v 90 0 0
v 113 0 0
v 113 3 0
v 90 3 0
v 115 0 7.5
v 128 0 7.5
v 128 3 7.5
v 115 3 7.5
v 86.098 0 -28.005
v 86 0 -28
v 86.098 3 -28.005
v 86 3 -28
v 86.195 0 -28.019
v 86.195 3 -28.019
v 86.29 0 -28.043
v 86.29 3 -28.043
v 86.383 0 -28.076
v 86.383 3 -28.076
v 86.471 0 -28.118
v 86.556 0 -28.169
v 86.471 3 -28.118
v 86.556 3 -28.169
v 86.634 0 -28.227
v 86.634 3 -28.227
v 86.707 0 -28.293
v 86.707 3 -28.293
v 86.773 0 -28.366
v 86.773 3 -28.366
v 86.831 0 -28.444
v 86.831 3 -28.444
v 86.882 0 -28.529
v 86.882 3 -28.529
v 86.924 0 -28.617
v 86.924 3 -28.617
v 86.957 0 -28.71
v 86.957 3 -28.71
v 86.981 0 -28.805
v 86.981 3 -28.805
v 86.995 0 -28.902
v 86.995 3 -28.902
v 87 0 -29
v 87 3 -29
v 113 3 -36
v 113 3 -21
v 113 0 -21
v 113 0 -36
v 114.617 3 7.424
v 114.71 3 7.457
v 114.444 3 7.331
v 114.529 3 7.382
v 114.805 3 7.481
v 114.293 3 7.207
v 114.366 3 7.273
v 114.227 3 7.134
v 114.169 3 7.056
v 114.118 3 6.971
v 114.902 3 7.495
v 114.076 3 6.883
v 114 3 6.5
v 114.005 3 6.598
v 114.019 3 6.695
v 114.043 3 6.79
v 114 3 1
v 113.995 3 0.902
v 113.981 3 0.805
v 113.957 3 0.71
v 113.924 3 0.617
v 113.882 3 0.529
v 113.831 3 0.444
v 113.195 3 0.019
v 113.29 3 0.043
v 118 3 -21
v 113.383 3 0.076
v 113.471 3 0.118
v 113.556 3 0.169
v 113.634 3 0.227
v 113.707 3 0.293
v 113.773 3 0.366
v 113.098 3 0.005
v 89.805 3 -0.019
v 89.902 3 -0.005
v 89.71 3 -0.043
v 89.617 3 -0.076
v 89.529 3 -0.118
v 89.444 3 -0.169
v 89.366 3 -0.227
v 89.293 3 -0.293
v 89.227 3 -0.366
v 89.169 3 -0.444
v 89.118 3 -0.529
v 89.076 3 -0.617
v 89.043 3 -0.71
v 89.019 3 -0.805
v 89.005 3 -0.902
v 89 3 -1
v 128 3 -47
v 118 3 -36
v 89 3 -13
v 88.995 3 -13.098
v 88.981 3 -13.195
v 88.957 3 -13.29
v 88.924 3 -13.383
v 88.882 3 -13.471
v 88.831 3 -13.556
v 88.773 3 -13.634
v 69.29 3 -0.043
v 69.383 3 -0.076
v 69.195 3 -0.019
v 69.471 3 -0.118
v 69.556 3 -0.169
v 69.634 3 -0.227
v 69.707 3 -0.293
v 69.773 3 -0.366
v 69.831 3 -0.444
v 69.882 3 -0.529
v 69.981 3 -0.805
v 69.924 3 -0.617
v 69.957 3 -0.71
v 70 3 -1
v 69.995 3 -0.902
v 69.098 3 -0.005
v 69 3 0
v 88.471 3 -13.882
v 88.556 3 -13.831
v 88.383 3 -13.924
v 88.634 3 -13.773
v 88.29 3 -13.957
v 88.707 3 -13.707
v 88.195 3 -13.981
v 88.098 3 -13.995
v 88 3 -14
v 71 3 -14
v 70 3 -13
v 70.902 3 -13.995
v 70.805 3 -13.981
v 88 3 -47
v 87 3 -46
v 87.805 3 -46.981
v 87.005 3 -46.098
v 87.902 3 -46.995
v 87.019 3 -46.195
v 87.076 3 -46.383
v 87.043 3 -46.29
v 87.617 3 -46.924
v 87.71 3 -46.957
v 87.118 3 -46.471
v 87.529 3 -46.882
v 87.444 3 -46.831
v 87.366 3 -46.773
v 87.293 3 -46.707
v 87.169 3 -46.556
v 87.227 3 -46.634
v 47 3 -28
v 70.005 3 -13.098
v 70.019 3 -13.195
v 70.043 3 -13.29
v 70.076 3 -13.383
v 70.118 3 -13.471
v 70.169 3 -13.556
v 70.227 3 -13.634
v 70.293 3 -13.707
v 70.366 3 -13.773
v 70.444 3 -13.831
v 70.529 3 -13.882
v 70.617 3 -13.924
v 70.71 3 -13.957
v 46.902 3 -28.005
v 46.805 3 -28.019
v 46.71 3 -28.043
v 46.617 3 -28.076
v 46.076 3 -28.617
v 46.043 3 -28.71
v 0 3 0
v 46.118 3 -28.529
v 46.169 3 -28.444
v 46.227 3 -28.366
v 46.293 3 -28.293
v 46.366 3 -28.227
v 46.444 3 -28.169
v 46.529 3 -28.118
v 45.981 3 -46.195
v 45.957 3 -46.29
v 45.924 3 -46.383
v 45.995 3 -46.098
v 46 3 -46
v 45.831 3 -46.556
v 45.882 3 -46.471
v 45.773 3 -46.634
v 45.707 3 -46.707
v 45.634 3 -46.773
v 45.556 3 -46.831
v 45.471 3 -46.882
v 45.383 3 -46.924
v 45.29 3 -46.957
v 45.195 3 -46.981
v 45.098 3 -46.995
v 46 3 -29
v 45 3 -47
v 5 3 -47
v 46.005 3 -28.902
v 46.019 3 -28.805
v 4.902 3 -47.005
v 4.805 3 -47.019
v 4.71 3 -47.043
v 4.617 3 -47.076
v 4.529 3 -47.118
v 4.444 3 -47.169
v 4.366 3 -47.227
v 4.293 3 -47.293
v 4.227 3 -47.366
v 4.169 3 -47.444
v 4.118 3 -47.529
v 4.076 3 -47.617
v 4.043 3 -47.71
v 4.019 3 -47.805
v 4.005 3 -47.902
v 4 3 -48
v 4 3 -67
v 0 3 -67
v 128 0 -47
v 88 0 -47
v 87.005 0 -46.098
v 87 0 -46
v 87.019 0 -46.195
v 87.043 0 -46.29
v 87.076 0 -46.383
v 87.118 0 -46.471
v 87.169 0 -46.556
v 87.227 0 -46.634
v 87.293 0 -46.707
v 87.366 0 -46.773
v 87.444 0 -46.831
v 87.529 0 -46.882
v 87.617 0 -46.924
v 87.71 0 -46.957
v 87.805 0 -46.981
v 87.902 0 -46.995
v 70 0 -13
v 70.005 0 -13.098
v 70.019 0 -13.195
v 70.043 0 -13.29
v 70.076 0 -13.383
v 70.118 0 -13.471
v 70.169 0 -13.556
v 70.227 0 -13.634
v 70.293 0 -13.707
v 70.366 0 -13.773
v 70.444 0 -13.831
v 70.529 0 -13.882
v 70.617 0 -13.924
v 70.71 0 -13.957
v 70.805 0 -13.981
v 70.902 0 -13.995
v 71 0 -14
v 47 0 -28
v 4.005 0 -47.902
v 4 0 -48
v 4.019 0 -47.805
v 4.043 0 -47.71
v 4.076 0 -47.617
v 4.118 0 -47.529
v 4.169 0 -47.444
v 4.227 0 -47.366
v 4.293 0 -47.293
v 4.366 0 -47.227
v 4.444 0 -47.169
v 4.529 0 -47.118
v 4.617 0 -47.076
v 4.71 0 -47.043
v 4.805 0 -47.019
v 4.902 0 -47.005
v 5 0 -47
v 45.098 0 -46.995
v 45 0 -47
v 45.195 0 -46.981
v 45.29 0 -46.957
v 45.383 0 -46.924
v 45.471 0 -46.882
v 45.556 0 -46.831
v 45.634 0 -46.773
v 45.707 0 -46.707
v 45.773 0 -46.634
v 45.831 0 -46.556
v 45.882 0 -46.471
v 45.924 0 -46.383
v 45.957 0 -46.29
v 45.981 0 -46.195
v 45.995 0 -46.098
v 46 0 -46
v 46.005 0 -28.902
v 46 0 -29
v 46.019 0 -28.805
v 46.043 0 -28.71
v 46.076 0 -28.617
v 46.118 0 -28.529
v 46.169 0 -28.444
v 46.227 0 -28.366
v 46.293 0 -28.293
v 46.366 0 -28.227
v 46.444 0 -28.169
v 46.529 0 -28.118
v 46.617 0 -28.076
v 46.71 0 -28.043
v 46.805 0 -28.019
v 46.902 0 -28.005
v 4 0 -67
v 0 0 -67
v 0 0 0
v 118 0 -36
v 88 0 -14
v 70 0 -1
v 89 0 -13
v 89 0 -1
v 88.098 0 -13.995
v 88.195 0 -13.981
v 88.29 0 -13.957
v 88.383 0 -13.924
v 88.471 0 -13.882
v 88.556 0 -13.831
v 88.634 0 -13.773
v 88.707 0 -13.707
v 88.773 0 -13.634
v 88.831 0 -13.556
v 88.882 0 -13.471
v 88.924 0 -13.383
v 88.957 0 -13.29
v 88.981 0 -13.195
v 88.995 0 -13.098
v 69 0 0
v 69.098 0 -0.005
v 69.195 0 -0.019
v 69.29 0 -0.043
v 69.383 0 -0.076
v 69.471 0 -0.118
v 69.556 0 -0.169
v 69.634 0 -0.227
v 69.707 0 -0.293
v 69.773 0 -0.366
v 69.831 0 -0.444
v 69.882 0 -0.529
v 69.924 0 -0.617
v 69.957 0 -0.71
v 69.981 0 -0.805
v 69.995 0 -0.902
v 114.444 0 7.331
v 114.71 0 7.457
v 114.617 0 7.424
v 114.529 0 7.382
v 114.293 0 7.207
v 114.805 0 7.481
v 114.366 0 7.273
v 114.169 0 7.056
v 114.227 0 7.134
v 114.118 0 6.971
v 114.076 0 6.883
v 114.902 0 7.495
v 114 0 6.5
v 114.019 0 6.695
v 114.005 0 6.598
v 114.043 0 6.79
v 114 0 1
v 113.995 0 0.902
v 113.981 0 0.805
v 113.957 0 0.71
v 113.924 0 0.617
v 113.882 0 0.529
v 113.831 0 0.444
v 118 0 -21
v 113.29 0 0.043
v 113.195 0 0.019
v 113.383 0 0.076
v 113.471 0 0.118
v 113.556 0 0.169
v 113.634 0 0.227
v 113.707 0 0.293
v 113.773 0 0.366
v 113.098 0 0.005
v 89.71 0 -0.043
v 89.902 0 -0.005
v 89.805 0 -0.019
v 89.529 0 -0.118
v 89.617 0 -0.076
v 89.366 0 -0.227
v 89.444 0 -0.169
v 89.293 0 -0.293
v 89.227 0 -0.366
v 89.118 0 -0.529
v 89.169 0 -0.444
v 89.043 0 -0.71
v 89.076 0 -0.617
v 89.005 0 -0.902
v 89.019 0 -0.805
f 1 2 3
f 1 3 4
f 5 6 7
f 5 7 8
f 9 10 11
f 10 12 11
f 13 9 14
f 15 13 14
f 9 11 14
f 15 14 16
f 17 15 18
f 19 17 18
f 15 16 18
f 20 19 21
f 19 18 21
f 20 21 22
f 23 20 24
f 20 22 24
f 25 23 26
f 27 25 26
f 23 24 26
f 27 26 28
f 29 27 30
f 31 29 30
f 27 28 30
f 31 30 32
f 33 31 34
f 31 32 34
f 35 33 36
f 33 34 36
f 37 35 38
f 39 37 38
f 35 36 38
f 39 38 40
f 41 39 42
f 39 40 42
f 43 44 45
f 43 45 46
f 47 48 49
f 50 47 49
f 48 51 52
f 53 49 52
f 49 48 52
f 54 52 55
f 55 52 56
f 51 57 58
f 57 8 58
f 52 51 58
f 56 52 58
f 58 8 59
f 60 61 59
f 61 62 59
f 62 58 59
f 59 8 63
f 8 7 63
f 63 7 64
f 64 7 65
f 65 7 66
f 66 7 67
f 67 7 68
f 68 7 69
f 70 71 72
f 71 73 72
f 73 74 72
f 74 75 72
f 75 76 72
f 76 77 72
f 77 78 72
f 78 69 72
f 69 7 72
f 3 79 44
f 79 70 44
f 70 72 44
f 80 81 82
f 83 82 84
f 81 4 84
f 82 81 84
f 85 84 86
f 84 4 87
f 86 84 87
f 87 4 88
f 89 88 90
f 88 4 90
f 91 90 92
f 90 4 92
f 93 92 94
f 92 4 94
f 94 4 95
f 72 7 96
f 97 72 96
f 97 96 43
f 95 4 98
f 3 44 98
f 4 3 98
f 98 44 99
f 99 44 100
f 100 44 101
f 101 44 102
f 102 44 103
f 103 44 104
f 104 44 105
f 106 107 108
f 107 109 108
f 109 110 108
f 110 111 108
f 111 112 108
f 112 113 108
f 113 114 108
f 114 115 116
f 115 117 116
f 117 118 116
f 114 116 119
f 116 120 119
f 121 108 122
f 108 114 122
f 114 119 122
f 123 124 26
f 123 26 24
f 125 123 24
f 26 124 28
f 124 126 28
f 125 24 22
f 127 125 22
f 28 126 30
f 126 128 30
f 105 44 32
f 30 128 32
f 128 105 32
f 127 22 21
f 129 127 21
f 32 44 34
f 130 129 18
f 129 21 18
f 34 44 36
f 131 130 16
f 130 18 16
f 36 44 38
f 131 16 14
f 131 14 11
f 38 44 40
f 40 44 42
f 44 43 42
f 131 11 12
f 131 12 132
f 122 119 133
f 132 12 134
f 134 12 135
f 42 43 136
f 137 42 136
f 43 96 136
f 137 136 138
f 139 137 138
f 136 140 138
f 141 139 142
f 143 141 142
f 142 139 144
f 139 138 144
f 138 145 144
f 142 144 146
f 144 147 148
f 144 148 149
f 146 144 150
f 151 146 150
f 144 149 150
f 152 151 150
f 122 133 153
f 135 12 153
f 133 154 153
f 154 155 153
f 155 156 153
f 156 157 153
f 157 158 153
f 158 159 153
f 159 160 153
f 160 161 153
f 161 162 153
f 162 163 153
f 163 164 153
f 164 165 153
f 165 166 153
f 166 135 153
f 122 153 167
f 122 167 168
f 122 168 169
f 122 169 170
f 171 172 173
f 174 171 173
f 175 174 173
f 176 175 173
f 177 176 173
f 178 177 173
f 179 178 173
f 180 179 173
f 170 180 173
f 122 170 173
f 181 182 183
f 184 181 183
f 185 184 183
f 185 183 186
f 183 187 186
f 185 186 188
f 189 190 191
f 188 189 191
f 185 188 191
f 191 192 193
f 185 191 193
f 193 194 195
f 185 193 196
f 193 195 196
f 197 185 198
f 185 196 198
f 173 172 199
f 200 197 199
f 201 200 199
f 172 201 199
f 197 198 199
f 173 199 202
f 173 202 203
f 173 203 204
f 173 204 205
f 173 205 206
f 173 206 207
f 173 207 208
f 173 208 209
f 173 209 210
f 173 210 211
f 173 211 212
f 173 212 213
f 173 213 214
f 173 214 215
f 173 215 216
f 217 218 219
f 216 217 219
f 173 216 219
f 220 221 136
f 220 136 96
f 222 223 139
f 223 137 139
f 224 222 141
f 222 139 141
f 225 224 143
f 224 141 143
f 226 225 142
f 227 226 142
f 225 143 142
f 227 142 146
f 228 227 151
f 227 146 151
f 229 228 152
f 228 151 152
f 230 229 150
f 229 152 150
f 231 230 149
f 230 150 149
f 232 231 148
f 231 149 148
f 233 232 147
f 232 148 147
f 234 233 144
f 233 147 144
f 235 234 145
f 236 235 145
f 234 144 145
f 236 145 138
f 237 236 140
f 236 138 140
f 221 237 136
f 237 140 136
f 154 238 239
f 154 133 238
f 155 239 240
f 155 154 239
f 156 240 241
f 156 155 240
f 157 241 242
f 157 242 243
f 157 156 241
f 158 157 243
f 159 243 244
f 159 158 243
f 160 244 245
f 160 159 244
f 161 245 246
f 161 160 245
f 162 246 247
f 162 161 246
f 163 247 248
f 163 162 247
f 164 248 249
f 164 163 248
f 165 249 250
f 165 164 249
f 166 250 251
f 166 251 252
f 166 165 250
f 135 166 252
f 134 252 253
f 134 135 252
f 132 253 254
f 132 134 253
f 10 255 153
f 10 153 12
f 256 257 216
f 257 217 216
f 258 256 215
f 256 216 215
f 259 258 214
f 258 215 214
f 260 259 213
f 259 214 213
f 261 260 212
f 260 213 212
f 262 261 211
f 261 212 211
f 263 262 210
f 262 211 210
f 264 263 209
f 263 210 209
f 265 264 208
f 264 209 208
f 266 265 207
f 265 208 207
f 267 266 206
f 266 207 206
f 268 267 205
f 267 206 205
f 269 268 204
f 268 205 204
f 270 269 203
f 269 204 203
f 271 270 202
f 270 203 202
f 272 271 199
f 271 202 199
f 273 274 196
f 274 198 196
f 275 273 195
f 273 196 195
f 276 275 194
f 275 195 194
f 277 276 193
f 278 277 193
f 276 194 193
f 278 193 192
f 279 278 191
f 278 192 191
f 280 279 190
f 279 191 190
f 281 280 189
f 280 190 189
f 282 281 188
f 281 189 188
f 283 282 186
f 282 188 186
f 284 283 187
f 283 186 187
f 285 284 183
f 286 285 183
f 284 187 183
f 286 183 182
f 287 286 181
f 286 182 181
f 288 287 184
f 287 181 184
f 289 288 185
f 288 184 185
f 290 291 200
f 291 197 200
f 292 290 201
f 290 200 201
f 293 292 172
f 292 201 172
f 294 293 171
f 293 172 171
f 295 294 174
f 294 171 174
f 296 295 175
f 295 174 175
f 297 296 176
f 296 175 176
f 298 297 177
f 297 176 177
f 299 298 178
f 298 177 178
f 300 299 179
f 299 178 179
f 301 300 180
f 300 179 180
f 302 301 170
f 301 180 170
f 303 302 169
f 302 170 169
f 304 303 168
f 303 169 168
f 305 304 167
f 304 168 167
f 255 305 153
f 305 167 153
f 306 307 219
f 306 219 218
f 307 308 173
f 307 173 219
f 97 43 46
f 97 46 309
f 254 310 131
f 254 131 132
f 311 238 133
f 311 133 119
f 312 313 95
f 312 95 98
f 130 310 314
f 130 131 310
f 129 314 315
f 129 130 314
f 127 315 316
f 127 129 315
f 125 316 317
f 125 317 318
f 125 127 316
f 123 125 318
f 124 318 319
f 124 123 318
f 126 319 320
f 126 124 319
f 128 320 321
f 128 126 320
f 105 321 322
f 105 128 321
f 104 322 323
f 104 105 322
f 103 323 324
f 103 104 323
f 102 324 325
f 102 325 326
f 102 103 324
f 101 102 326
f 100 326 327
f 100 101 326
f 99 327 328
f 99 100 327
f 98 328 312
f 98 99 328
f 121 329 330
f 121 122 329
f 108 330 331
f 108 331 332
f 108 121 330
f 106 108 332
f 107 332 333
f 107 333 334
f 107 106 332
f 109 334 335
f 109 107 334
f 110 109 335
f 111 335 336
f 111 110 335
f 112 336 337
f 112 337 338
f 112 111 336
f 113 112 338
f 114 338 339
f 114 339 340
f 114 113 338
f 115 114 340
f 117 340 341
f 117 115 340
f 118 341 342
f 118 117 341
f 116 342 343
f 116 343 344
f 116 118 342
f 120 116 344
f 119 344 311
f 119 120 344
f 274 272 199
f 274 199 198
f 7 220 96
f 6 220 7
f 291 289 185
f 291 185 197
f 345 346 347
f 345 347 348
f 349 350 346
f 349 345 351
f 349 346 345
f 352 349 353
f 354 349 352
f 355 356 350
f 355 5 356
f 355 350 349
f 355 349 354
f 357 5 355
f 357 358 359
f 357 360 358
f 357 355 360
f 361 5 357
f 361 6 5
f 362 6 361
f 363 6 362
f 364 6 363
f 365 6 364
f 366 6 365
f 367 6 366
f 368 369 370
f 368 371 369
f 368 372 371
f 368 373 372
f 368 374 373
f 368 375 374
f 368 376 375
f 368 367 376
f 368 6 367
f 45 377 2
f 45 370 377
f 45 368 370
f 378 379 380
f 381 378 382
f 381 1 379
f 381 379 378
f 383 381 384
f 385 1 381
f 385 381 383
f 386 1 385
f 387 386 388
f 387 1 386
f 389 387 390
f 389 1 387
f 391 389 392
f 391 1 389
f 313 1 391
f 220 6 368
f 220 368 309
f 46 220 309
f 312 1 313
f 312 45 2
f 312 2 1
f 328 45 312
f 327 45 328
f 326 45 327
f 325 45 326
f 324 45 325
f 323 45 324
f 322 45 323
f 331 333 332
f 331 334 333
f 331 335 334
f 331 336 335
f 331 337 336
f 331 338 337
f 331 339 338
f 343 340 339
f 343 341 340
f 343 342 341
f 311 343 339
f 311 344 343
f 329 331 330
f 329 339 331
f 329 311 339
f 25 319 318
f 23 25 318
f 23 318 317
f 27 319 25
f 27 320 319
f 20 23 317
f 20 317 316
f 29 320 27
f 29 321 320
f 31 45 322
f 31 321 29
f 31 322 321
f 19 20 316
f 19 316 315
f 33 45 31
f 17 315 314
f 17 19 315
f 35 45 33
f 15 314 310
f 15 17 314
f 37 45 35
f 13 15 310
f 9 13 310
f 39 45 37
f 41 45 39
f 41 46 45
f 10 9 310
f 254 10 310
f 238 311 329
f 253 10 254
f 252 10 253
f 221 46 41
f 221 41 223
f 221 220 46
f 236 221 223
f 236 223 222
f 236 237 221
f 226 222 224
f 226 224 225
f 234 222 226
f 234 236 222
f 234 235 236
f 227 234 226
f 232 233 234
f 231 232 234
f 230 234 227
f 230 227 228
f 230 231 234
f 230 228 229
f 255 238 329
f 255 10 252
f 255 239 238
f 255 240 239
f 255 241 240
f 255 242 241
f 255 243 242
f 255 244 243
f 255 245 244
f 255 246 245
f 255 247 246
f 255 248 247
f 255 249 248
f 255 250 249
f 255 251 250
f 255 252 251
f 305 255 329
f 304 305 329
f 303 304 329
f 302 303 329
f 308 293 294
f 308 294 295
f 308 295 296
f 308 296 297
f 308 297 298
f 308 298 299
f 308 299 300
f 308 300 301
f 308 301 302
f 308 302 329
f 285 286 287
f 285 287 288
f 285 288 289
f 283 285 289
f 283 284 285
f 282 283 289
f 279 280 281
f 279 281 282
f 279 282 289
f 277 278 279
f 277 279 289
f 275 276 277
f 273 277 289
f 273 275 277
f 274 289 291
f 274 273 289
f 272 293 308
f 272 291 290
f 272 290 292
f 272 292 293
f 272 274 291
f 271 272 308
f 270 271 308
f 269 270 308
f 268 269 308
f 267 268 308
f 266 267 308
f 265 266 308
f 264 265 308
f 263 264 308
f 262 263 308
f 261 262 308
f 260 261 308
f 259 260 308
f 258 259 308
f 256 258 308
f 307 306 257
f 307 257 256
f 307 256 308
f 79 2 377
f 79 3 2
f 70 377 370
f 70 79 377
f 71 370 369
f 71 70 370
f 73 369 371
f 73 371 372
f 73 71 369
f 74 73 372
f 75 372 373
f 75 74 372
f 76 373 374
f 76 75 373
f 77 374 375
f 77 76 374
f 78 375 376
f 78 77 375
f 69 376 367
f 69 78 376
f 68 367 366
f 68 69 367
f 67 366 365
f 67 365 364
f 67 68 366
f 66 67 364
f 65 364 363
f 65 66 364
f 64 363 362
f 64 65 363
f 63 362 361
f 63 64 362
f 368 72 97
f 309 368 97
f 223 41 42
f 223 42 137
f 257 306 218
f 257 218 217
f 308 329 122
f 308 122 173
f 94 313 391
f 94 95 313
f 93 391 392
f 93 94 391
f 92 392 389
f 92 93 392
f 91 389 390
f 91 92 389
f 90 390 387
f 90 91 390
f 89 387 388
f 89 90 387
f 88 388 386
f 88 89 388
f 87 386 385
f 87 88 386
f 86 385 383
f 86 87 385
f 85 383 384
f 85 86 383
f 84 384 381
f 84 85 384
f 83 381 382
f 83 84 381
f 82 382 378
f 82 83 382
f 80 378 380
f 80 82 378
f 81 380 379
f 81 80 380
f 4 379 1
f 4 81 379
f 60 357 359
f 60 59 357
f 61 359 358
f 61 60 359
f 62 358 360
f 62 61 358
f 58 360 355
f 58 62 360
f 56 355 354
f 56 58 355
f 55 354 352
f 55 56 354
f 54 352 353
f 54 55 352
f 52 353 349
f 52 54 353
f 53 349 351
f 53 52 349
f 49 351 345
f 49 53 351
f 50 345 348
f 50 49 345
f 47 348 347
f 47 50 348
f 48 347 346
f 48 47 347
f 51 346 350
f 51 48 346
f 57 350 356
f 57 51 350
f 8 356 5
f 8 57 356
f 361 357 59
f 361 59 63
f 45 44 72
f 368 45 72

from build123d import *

# Parameters (mm, degrees)
BOSS_EXTRUDE1_DEPTH = 3
SKETCH2_W           = 5
SKETCH2_H           = 15
CUT_EXTRUDE1_DEPTH  = 145.506055236
FILLET1_R           = 1


with BuildPart() as part:
    # Sketch1 → Boss-Extrude1 (new body)
    with BuildSketch(Plane(origin=(0, 0, 0), x_dir=(1, 0, 0), z_dir=(0, 1, 0))):
        Polygon((0, 67), (4, 67), (4, 47), (46, 47), (46, 28), (87, 28), (87, 47), (128, 47), (128, -7.5), (114, -7.5), (114, 0), (89, 0), (89, 14), (70, 14), (70, 0), (0, 0), align=None)
    extrude(amount=BOSS_EXTRUDE1_DEPTH)

    # Sketch2 → Cut-Extrude1 (cut, through all)
    with BuildSketch(Plane(origin=(0, 3, 0), x_dir=(1, 0, 0), z_dir=(0, 1, 0))):
        with Locations((115.5, 28.5)):
            Rectangle(SKETCH2_W, SKETCH2_H)
    extrude(amount=-CUT_EXTRUDE1_DEPTH, mode=Mode.SUBTRACT)

    # Fillet1
    fillet1_edges = [part.edges().sort_by_distance(p)[0] for p in [
        (4, 1.5, -47),
        (46, 1.5, -47),
        (46, 1.5, -28),
        (87, 1.5, -28),
        (87, 1.5, -47),
        (114, 1.5, 7.5),
        (114, 1.5, 0),
        (89, 1.5, 0),
        (89, 1.5, -14),
        (70, 1.5, -14),
        (70, 1.5, 0),
    ]]
    fillet(fillet1_edges, radius=FILLET1_R)


solid = part.part
